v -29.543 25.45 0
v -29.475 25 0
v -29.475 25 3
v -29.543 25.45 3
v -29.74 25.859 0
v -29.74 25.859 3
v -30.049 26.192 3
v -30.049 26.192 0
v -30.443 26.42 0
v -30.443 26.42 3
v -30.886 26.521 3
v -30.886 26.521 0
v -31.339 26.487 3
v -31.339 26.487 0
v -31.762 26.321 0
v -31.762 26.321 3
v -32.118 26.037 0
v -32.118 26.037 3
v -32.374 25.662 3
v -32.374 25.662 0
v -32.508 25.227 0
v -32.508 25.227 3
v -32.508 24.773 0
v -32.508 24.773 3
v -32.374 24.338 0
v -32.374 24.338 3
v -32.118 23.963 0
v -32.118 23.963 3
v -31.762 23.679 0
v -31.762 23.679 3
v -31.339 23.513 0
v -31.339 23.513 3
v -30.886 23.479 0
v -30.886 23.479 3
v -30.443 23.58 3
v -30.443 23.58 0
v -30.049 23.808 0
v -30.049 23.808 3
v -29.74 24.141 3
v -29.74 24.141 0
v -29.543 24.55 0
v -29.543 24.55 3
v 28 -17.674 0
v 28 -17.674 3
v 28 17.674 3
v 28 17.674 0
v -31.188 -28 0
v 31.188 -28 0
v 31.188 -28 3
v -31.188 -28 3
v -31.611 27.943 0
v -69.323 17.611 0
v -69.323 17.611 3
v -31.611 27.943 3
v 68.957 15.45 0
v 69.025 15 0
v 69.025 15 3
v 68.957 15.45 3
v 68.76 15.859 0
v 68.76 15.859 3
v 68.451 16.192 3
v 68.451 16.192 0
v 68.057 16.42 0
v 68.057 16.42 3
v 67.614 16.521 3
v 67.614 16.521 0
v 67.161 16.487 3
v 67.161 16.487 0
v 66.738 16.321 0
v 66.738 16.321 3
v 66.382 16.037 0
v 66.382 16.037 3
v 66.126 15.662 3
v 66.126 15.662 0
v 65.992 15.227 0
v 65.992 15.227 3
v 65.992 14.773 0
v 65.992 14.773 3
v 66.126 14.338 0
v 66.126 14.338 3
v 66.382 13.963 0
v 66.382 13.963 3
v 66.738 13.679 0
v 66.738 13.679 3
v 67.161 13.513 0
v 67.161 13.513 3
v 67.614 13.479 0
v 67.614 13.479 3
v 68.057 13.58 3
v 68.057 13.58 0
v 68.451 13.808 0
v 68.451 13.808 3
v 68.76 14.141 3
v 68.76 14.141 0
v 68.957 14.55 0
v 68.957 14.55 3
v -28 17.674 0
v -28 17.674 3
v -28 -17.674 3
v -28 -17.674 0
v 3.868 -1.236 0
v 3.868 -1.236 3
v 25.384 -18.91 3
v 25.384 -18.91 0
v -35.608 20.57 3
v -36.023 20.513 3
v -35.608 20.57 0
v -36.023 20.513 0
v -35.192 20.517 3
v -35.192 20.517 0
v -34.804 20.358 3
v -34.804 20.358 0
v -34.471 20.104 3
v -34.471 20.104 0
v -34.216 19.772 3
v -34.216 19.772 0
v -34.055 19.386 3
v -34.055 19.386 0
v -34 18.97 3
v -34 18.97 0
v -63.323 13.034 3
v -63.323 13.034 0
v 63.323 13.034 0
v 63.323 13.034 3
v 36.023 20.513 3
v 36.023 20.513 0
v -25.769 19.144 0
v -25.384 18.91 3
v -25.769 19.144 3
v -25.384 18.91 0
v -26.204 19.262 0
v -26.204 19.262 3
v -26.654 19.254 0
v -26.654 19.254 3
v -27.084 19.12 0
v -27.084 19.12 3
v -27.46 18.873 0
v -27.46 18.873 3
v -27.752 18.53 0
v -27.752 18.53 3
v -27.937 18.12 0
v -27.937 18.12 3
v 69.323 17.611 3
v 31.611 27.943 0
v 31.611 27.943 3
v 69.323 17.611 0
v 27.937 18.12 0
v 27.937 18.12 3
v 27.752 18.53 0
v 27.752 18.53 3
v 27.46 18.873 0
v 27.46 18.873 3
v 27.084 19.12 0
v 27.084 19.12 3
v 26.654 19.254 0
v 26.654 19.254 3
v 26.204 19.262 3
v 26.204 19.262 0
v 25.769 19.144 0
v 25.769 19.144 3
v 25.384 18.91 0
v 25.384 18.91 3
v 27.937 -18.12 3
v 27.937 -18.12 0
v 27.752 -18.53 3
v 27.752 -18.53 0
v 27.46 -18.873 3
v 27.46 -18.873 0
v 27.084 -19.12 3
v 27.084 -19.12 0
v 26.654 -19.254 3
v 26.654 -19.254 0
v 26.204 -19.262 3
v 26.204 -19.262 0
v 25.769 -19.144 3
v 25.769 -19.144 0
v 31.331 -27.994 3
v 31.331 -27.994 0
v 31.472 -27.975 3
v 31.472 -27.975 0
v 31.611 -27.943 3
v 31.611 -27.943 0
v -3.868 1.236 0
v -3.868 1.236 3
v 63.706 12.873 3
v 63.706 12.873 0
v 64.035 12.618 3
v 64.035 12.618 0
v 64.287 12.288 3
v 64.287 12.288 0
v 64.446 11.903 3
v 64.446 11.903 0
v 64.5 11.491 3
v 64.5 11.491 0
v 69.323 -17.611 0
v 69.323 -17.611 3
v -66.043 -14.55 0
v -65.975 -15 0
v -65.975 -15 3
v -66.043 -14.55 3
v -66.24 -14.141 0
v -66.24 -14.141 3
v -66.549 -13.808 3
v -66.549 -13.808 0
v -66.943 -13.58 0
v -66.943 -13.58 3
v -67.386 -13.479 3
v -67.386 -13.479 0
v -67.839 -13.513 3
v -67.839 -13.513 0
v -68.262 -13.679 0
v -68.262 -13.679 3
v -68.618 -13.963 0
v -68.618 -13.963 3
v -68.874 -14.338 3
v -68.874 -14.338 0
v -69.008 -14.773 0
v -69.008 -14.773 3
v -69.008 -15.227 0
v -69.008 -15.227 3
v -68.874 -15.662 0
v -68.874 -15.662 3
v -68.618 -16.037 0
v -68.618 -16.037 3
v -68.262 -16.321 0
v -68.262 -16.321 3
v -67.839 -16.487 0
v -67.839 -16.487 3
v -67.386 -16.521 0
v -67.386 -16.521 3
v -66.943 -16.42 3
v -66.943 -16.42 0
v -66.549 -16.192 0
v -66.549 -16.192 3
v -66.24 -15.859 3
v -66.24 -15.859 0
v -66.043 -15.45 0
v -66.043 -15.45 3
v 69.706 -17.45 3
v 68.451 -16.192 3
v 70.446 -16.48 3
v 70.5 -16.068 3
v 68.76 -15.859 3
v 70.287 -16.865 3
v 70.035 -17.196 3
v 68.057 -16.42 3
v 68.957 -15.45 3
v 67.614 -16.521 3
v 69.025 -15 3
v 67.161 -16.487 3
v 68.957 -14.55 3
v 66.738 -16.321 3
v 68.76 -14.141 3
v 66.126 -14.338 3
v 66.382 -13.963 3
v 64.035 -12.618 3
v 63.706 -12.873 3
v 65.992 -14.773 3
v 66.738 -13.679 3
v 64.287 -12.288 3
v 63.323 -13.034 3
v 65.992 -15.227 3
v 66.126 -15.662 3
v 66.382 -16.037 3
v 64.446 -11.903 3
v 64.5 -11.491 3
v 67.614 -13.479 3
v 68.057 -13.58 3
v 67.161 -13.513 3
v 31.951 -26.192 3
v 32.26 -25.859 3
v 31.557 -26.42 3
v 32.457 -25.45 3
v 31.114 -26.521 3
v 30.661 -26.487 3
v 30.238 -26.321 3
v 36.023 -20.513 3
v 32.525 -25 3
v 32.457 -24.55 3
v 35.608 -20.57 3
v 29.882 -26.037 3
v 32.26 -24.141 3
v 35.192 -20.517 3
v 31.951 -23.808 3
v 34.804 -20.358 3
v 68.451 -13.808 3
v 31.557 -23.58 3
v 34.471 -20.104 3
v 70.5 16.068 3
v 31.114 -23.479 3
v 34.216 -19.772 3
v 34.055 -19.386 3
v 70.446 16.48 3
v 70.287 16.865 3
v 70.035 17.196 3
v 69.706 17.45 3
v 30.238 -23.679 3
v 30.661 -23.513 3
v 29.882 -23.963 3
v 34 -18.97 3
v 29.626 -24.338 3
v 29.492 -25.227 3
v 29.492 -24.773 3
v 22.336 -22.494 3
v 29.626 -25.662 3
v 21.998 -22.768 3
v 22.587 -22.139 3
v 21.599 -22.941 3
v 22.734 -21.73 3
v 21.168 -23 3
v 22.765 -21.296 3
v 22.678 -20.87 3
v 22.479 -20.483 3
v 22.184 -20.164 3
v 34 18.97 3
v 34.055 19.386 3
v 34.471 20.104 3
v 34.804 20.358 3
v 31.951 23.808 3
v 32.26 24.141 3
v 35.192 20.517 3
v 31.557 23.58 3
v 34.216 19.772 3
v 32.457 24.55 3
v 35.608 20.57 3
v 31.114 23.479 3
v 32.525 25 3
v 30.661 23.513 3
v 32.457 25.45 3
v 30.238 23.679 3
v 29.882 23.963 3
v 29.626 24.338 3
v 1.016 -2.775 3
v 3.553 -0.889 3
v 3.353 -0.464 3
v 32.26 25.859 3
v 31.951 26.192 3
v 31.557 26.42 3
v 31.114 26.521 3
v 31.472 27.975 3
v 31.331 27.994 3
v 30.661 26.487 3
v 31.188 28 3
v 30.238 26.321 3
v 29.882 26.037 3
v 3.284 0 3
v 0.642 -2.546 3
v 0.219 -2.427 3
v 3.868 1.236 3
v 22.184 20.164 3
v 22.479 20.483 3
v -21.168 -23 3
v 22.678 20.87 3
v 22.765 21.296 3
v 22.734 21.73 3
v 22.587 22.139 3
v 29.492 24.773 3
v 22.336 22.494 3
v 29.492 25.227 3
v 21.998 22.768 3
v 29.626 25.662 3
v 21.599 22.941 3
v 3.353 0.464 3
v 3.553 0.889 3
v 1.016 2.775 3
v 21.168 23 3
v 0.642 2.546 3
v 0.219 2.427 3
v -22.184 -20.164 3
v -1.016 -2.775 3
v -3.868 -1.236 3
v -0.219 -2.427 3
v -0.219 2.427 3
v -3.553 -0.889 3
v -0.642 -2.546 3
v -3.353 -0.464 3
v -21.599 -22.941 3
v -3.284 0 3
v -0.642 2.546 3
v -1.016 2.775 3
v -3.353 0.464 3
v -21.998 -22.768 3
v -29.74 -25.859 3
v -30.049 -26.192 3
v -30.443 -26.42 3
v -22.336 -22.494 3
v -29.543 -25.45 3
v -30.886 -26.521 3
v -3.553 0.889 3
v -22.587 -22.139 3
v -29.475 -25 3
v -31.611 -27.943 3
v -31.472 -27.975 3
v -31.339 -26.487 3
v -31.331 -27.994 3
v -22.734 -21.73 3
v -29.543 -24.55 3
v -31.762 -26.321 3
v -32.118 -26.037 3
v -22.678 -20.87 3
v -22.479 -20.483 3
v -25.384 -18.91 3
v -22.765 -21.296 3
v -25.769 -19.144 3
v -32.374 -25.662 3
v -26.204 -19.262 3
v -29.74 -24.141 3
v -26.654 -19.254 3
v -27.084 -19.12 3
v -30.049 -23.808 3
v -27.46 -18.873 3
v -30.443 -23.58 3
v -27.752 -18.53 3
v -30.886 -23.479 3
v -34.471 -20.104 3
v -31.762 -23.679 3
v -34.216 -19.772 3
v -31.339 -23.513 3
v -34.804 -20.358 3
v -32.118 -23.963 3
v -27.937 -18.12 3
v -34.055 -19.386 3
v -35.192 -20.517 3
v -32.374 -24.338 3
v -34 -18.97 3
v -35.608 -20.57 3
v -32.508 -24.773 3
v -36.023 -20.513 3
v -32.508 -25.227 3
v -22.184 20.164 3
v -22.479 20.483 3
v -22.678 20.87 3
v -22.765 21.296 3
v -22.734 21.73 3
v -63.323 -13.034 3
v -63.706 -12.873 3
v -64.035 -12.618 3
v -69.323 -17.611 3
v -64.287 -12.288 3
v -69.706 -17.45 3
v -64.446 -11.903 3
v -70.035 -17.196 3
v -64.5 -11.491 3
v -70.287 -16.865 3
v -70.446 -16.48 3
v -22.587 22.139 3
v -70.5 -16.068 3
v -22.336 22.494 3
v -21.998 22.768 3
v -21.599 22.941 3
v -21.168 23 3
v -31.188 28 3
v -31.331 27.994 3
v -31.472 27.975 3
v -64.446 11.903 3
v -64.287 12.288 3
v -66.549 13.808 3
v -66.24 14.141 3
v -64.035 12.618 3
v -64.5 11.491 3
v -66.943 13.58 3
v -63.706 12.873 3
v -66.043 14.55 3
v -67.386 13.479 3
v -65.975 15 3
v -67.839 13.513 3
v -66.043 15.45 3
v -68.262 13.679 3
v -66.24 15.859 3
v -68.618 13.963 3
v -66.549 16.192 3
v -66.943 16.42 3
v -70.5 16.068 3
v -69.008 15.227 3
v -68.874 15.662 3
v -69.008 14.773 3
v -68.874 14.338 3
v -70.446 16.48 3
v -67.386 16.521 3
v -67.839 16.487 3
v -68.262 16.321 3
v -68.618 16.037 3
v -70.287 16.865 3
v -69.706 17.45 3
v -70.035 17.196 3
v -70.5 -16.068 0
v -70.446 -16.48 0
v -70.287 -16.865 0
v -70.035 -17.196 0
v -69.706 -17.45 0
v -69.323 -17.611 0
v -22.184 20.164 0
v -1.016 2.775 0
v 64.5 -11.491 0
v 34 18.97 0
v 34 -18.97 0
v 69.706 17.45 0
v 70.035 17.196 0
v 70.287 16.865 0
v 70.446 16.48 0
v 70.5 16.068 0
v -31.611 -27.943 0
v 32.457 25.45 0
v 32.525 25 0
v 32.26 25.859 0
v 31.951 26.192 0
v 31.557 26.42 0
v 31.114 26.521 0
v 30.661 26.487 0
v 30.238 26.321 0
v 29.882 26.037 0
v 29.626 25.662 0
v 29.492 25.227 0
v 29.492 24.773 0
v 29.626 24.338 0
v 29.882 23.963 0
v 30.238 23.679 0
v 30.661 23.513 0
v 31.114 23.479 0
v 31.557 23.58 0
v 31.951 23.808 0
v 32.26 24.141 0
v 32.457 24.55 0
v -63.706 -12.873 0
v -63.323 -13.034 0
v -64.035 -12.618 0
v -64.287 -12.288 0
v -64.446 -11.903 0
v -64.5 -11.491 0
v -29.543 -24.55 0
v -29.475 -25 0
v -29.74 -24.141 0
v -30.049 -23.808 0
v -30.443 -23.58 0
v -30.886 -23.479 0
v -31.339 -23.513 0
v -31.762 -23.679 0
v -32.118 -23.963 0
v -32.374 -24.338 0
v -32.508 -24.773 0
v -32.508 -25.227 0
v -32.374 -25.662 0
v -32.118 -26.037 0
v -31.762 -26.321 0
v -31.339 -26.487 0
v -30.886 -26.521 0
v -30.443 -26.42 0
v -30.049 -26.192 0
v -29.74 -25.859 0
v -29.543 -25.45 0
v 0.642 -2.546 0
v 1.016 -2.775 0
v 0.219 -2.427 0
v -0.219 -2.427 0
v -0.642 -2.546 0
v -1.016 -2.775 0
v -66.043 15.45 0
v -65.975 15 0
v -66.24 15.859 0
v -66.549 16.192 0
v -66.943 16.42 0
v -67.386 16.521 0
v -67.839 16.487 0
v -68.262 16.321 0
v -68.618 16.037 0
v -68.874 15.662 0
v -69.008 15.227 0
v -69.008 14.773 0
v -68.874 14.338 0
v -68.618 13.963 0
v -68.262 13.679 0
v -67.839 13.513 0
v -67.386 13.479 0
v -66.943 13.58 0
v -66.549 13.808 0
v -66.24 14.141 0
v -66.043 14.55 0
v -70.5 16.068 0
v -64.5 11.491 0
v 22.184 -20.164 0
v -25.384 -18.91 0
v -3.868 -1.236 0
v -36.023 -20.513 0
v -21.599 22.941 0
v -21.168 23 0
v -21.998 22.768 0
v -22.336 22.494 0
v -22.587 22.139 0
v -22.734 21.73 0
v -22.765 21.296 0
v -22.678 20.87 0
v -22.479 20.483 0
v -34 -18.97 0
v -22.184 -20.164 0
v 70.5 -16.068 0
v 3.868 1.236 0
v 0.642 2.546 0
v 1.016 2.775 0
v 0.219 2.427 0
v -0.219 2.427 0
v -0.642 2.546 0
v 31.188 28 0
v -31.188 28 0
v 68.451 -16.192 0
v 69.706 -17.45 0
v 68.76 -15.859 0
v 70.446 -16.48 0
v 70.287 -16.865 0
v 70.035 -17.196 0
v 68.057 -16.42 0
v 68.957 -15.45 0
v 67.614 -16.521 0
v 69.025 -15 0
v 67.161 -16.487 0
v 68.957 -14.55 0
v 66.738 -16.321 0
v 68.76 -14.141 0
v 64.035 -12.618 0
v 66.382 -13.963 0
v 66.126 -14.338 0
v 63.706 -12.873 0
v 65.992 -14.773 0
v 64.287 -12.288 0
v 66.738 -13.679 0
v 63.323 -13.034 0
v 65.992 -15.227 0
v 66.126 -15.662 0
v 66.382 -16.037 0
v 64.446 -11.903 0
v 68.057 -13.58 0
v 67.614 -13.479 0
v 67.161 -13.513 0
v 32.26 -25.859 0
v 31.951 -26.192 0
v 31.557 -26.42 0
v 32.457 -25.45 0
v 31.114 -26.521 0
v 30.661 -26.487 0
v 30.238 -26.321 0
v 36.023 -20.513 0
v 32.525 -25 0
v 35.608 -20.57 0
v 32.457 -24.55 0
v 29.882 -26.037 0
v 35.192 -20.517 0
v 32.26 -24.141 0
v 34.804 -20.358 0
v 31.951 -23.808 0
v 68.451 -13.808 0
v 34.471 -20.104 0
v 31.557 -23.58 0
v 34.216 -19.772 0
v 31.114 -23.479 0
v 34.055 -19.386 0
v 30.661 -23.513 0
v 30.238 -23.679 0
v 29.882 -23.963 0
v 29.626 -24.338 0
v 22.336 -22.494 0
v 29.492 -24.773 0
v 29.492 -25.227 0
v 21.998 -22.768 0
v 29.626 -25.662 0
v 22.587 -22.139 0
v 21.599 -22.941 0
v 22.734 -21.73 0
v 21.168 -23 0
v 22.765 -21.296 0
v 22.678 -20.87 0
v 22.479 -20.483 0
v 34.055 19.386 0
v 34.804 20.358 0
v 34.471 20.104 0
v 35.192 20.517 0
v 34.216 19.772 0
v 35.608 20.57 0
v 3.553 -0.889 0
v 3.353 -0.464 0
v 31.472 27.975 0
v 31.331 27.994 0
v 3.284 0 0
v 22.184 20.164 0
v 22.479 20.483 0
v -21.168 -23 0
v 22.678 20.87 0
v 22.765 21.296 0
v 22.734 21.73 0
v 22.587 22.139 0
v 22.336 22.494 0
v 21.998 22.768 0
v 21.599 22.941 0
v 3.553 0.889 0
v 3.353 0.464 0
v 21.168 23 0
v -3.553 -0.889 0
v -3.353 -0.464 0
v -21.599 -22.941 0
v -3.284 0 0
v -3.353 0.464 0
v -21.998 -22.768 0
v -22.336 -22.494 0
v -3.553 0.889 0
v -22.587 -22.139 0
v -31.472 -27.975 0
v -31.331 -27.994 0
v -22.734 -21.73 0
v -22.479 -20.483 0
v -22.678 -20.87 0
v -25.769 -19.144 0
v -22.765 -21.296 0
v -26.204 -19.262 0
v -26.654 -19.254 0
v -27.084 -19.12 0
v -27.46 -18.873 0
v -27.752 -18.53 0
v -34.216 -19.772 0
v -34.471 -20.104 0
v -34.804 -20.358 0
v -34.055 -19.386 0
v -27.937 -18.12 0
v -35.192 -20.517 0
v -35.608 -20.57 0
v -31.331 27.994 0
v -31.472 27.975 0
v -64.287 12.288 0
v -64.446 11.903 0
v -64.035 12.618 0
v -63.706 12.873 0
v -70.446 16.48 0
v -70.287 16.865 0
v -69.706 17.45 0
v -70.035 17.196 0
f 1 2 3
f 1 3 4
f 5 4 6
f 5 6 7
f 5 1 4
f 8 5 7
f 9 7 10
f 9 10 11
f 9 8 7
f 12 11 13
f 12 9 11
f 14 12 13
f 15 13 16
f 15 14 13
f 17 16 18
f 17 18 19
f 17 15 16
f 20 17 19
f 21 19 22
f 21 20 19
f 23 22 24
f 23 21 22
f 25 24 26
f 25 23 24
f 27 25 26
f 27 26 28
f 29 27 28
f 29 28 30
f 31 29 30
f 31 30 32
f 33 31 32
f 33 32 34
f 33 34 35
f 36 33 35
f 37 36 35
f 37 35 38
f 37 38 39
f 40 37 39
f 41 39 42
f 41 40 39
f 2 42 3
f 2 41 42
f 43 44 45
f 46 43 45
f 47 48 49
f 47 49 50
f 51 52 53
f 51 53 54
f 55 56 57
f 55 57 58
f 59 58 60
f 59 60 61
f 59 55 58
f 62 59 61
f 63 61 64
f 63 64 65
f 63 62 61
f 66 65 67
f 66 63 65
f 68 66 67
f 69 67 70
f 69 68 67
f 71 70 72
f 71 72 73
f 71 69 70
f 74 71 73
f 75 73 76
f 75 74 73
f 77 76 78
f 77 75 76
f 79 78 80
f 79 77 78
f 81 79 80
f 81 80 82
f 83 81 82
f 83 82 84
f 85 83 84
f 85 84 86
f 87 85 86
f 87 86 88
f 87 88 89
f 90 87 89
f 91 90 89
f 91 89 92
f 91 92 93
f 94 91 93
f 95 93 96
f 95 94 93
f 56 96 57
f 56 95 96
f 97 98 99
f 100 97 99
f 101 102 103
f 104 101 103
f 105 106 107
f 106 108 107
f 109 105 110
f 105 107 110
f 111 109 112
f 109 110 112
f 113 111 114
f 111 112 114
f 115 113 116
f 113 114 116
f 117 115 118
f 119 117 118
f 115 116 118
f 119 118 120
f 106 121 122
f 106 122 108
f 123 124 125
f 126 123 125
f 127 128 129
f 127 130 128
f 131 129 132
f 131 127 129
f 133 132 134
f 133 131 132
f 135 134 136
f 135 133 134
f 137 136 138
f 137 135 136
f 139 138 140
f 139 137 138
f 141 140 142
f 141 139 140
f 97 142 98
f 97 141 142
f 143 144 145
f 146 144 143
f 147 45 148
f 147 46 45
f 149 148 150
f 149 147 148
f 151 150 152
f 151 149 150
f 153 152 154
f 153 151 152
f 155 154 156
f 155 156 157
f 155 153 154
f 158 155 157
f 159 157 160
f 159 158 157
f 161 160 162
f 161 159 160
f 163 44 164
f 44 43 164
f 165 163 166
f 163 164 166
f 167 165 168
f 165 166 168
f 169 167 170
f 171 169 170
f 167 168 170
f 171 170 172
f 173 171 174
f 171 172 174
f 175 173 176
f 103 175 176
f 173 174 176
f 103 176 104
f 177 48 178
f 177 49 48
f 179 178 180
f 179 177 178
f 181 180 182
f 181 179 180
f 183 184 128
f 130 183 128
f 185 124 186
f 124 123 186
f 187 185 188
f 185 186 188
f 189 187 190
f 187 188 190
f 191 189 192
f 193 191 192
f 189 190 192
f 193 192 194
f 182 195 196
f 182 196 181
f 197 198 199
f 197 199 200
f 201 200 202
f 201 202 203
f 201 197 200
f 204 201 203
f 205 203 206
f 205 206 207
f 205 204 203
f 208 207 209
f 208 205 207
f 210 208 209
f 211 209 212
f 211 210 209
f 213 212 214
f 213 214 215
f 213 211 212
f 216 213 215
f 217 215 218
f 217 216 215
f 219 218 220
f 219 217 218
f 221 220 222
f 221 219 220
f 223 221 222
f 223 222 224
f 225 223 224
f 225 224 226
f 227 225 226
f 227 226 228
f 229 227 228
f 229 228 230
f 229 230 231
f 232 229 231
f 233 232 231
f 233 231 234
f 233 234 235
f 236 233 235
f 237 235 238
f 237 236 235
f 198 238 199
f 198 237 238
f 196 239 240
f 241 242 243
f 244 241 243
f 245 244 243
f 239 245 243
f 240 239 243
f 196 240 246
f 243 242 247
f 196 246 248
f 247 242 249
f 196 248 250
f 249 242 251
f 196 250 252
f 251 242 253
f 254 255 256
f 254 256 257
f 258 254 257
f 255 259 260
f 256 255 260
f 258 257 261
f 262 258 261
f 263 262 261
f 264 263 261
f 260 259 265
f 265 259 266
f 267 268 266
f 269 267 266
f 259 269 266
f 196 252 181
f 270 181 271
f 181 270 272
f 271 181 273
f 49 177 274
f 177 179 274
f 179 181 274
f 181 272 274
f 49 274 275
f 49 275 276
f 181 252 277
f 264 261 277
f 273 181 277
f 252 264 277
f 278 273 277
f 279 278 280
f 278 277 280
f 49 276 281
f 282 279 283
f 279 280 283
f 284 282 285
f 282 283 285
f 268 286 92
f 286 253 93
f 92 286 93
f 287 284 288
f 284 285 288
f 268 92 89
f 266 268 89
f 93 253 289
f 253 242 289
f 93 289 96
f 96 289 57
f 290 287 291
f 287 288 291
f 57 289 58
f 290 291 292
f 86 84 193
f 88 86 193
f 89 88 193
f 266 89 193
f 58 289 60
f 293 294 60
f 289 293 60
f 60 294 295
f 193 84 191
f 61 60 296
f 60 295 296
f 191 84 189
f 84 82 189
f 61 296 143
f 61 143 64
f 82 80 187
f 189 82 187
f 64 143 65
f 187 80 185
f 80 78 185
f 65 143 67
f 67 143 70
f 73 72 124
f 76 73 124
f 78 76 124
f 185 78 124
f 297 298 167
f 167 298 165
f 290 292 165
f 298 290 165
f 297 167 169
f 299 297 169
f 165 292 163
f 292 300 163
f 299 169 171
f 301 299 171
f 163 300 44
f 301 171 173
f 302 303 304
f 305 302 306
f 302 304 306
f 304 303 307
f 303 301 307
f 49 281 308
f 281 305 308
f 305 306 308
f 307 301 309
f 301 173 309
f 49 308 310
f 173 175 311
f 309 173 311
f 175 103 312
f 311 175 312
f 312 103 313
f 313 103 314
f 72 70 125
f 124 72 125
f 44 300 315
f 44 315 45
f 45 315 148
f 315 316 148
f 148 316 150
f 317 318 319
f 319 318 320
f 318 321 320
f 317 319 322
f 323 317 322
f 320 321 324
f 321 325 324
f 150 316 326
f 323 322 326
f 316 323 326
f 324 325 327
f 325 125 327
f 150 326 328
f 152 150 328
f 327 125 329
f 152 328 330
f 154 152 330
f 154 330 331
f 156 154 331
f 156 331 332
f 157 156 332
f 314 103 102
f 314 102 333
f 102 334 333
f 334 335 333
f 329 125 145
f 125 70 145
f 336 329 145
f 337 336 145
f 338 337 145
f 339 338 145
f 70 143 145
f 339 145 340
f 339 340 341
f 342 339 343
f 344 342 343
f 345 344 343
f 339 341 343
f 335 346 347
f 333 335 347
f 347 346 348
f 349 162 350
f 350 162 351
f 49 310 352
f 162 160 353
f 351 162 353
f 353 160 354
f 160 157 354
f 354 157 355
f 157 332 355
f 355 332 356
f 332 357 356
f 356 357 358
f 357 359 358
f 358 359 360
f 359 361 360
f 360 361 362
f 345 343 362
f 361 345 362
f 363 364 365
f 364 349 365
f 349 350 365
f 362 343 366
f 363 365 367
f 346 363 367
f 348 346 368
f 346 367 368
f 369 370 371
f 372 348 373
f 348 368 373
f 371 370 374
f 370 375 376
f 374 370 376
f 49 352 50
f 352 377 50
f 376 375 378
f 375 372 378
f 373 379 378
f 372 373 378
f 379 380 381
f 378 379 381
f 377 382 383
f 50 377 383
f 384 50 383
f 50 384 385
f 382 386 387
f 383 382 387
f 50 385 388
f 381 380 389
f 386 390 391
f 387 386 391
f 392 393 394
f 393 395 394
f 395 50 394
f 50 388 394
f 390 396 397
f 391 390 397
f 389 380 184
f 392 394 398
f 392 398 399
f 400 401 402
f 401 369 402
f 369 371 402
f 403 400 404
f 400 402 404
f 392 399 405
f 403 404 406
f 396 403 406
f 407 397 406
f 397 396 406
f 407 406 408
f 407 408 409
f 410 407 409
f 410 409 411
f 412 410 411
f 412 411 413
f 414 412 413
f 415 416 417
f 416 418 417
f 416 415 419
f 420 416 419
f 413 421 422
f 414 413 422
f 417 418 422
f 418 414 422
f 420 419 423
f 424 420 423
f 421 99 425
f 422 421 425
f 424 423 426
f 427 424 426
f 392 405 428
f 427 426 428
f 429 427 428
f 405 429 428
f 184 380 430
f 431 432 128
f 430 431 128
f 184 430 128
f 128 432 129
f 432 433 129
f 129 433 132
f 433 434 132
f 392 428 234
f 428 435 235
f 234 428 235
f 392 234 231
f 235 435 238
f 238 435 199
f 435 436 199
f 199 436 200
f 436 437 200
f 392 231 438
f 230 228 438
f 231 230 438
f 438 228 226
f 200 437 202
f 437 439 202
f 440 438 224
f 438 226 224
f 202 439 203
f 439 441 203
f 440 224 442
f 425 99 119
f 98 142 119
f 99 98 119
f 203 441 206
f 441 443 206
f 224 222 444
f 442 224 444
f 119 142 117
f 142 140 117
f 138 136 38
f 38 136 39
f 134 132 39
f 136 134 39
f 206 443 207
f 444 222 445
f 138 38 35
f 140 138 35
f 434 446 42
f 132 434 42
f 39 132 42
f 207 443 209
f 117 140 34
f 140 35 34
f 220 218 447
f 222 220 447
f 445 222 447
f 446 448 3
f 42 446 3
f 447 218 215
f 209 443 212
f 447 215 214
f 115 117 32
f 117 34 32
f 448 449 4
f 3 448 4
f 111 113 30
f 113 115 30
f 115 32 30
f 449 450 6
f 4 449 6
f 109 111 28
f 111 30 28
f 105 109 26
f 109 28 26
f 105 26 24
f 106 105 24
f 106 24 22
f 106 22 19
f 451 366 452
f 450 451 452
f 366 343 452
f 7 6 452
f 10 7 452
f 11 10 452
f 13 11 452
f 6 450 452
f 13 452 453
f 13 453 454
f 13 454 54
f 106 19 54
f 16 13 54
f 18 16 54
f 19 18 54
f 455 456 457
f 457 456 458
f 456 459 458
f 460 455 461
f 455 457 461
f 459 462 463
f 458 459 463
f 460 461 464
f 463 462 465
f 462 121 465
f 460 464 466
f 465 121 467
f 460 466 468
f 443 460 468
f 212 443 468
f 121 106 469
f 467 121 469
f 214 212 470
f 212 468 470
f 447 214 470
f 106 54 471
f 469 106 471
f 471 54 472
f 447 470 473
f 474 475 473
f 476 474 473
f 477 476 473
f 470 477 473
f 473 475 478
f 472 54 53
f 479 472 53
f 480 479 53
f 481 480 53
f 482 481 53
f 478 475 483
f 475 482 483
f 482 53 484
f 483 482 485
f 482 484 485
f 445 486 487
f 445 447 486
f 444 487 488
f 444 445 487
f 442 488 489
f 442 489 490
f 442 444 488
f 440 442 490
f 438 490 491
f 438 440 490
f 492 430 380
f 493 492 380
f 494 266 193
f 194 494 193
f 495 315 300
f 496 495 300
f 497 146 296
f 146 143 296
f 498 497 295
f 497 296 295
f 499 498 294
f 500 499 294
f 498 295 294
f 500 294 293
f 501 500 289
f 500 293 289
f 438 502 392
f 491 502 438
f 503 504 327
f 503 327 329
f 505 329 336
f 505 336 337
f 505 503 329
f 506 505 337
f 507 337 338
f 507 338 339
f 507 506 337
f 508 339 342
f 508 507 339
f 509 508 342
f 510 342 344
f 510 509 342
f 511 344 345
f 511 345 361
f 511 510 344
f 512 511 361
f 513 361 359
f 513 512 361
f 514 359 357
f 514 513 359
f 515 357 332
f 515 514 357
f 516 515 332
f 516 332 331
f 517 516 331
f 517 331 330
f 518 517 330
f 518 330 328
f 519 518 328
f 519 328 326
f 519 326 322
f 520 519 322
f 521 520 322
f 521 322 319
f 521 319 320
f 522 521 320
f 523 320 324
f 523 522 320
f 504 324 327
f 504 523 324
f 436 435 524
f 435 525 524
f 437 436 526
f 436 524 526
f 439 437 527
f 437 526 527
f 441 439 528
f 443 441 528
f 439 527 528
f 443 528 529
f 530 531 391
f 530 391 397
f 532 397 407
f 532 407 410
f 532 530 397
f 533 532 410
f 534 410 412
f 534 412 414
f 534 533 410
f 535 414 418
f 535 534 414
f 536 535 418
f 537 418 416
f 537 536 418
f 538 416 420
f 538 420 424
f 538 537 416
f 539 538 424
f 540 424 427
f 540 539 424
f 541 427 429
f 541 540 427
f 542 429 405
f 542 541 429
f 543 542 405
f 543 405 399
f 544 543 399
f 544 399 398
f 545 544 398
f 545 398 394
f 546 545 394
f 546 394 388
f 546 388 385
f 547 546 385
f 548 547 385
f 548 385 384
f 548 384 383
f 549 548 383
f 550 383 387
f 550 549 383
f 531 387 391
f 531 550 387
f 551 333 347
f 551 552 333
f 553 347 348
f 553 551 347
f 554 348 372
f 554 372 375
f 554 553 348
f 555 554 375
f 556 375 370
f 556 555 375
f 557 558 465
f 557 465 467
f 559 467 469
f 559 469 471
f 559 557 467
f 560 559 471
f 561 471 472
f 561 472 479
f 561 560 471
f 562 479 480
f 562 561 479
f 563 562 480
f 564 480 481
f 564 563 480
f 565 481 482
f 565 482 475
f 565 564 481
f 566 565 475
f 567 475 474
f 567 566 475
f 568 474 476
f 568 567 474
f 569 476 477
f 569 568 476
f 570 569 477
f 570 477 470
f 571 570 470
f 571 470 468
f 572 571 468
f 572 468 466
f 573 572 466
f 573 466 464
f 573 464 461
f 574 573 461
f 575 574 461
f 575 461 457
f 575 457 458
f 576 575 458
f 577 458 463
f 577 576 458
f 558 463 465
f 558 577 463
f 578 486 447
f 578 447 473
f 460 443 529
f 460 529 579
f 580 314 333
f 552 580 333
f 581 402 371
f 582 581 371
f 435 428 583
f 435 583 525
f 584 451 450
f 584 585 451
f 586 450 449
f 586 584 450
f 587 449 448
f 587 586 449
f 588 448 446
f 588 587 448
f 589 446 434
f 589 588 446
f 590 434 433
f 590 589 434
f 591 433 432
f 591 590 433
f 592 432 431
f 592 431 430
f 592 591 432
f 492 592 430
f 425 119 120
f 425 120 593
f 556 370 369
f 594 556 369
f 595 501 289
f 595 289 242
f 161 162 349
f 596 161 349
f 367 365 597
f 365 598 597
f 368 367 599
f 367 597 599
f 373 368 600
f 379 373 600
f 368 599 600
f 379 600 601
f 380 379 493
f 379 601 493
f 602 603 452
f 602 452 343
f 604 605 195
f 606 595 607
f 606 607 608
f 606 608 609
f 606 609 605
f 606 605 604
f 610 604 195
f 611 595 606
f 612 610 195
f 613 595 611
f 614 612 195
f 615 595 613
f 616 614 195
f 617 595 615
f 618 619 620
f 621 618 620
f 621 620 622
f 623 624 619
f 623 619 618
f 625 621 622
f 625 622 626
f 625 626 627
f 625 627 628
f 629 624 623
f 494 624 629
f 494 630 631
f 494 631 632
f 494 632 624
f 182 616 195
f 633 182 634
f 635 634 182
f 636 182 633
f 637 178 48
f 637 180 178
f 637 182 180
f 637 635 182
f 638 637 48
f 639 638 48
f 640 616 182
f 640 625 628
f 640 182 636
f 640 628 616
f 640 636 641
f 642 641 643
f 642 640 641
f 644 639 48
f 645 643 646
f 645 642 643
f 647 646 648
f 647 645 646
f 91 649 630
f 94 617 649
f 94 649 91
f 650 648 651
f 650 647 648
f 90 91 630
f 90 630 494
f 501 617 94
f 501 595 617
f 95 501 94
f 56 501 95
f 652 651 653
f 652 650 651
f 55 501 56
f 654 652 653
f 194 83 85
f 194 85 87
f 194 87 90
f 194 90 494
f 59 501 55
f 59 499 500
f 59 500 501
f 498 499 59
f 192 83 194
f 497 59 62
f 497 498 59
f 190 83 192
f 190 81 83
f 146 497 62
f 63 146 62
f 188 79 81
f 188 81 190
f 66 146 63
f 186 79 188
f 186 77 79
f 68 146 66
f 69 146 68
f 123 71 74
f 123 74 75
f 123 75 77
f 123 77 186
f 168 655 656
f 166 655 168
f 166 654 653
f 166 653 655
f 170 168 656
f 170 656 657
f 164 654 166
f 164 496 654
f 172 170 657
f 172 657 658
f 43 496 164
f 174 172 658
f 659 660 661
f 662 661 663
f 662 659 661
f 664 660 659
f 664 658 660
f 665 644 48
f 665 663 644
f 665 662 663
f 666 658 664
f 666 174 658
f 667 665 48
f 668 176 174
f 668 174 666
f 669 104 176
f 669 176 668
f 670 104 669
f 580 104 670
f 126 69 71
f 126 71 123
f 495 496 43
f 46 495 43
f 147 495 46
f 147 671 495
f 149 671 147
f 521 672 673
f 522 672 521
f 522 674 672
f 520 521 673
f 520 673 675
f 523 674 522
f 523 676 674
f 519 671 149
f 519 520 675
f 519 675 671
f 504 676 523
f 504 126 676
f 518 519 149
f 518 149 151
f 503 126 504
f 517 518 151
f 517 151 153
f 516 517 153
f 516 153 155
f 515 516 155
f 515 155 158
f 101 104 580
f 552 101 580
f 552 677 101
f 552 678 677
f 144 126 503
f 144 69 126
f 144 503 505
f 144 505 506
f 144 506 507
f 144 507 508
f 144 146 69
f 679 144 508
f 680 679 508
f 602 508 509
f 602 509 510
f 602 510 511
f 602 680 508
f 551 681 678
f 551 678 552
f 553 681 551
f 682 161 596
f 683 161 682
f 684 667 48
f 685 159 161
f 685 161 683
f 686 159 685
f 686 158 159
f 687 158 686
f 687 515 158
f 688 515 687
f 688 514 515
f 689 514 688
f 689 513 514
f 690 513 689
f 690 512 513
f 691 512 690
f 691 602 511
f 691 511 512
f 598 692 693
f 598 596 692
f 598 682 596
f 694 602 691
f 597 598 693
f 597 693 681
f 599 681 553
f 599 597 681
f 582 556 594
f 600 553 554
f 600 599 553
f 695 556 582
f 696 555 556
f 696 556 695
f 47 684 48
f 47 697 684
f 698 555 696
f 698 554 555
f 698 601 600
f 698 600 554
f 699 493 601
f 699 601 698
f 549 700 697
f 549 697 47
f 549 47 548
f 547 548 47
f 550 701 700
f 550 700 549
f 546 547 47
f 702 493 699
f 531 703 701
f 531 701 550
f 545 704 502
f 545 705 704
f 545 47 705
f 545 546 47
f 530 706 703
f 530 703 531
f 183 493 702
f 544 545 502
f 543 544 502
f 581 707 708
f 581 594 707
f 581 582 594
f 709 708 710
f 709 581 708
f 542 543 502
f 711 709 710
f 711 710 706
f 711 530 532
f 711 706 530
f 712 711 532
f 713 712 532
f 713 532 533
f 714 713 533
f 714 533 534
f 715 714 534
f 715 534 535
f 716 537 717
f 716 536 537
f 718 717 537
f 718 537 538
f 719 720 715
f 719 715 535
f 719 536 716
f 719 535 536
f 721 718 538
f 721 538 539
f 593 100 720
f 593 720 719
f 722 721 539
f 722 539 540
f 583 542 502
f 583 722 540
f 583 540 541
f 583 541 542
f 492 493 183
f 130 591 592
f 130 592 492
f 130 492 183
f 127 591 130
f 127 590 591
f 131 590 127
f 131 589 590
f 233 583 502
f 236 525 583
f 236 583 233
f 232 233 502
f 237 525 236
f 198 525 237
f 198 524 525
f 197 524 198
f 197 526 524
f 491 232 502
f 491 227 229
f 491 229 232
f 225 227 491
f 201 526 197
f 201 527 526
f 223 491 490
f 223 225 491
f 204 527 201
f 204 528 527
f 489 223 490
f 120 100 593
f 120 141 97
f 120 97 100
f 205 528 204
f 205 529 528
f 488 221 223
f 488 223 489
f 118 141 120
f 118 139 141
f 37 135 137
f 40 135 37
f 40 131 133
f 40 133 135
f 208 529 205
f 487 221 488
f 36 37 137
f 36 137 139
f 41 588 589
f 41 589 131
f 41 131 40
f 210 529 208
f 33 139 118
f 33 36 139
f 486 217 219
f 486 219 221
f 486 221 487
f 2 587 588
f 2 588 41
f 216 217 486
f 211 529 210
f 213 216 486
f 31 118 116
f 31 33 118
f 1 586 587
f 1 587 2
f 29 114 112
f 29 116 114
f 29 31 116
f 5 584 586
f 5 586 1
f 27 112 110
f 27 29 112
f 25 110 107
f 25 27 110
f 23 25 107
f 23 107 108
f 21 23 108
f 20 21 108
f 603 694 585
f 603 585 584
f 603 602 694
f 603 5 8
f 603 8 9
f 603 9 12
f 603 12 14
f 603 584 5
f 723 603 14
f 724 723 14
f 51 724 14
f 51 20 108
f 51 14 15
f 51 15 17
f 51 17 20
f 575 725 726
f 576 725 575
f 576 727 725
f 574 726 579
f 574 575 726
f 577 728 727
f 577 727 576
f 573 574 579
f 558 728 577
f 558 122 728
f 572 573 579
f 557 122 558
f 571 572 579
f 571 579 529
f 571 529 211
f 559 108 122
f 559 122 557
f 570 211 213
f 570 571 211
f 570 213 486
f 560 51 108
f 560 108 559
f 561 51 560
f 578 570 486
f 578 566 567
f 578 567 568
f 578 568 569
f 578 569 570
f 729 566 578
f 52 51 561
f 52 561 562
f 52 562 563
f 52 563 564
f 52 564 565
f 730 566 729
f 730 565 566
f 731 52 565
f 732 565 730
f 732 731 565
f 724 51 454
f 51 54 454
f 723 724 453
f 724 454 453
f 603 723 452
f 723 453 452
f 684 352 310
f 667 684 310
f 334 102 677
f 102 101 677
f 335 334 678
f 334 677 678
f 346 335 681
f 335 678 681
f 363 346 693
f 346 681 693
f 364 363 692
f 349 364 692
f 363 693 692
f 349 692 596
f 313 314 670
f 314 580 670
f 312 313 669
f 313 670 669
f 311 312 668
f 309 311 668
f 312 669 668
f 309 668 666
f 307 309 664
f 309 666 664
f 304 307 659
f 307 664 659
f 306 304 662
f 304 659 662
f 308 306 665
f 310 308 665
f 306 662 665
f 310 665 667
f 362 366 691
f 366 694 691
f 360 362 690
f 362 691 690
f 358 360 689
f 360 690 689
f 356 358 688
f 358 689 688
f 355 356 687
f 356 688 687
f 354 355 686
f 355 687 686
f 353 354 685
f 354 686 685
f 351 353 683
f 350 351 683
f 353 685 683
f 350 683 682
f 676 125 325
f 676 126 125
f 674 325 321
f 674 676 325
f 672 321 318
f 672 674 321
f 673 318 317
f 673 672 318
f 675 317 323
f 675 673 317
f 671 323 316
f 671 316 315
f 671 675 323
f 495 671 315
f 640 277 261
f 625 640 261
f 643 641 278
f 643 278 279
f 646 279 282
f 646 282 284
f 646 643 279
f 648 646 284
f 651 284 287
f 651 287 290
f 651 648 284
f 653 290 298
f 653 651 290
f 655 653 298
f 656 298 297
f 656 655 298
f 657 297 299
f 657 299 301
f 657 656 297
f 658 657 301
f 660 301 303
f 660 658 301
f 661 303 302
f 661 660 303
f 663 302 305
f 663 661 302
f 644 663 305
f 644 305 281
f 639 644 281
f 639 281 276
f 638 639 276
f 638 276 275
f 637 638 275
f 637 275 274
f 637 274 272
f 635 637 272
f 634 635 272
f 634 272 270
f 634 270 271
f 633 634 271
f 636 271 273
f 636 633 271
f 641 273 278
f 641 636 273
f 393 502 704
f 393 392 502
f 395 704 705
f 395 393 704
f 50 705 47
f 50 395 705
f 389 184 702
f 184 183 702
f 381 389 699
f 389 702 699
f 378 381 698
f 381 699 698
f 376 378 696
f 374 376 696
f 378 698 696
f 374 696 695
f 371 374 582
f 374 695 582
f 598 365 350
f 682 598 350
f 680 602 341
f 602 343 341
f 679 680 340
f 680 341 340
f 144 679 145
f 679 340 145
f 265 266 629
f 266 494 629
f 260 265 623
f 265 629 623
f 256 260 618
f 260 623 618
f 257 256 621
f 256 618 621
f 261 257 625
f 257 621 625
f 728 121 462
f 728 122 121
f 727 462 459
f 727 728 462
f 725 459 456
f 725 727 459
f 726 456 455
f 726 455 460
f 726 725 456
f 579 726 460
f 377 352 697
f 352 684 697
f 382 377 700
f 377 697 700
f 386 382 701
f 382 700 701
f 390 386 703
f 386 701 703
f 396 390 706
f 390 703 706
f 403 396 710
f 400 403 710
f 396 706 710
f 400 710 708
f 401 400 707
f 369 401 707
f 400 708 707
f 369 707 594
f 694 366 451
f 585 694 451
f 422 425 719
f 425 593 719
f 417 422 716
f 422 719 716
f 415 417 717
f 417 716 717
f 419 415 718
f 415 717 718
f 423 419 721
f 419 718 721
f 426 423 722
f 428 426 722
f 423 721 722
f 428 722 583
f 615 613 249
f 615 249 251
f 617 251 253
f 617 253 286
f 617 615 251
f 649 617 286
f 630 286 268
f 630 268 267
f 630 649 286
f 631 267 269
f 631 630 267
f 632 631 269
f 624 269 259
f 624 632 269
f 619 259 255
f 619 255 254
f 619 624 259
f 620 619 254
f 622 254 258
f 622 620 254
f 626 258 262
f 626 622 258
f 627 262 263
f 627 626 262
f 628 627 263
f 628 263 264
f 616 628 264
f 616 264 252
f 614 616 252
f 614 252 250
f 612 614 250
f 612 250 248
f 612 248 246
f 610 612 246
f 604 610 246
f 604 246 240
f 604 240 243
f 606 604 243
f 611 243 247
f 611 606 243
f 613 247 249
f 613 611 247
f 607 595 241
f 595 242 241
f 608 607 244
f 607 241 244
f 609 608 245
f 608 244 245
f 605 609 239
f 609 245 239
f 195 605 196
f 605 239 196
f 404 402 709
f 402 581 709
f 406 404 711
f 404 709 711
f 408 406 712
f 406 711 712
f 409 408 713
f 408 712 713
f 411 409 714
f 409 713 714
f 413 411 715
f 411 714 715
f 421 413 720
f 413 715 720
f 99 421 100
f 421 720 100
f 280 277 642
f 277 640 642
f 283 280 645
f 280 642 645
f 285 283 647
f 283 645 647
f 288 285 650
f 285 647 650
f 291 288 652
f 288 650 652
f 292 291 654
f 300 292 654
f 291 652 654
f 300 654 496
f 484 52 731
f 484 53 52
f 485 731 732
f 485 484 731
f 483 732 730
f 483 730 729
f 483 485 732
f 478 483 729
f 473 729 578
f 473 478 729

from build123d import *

# Parameters (mm, degrees)
SKETCH_1_R          = 1.525
EXTRUDE_1_DEPTH     = 3
CUT_EXTRUDE_1_DEPTH = 3
CUT_EXTRUDE_2_DEPTH = 3
FILLET_1_R          = 1.6


with BuildPart() as part:
    # 草图1 → 凸台-拉伸1 (new body)
    with BuildSketch(Plane.XY):
        Polygon((-70.5, 17.288636625), (-31.403523682, 28), (31.403523682, 28), (70.5, 17.288636625), (70.5, -17.288636625), (31.403523682, -28), (-31.403523682, -28), (-70.5, -17.288636625), align=None)
        with Locations((31, 25)):
            Circle(SKETCH_1_R, mode=Mode.SUBTRACT)
        with Locations((-31, 25)):
            Circle(SKETCH_1_R, mode=Mode.SUBTRACT)
        with Locations((-31, -25)):
            Circle(SKETCH_1_R, mode=Mode.SUBTRACT)
        with Locations((31, -25)):
            Circle(SKETCH_1_R, mode=Mode.SUBTRACT)
        with Locations((-67.5, -15)):
            Circle(SKETCH_1_R, mode=Mode.SUBTRACT)
        with Locations((-67.5, 15)):
            Circle(SKETCH_1_R, mode=Mode.SUBTRACT)
        with Locations((67.5, 15)):
            Circle(SKETCH_1_R, mode=Mode.SUBTRACT)
        with Locations((67.5, -15)):
            Circle(SKETCH_1_R, mode=Mode.SUBTRACT)
    extrude(amount=EXTRUDE_1_DEPTH)

    # 草图2 → 切除-拉伸1 (cut)
    with BuildSketch(Plane.XY.offset(3)):
        Polygon((-28, 21.058820972), (-28, -21.058820972), (-2.363174469, 0), align=None)
        Polygon((0, -1.941179028), (-25.636825531, -23), (25.636825531, -23), align=None)
        Polygon((28, 21.058820972), (2.363174469, 0), (28, -21.058820972), align=None)
        Polygon((-25.636825531, 23), (0, 1.941179028), (25.636825531, 23), align=None)
    extrude(amount=-CUT_EXTRUDE_1_DEPTH, mode=Mode.SUBTRACT)

    # 草图3 → 切除-拉伸2 (cut)
    with BuildSketch(Plane.XY.offset(3)):
        Polygon((34, 21.067527758), (34, -21.067527758), (64.5, -12.711363375), (64.5, 12.711363375), align=None)
        Polygon((-64.5, 12.711363375), (-34, 21.067527758), (-34, -21.067527758), (-64.5, -12.711363375), align=None)
    extrude(amount=-CUT_EXTRUDE_2_DEPTH, mode=Mode.SUBTRACT)

    # 圆角1
    fillet_1_edges = [part.edges().sort_by_distance(p)[0] for p in [
        (34, 21.067527758, 1.5),
        (64.5, 12.711363375, 1.5),
        (64.5, -12.711363375, 1.5),
        (34, -21.067527758, 1.5),
        (-34, 21.067527758, 1.5),
        (-34, -21.067527758, 1.5),
        (-64.5, -12.711363375, 1.5),
        (-64.5, 12.711363375, 1.5),
        (-70.5, 17.288636625, 1.5),
        (-31.403523682, 28, 1.5),
        (31.403523682, 28, 1.5),
        (70.5, 17.288636625, 1.5),
        (70.5, -17.288636625, 1.5),
        (31.403523682, -28, 1.5),
        (-31.403523682, -28, 1.5),
        (-70.5, -17.288636625, 1.5),
        (2.363174469, 0, 1.5),
        (28, 21.058820972, 1.5),
        (28, -21.058820972, 1.5),
        (-25.636825531, -23, 1.5),
        (0, -1.941179028, 1.5),
        (25.636825531, -23, 1.5),
        (0, 1.941179028, 1.5),
        (-25.636825531, 23, 1.5),
        (25.636825531, 23, 1.5),
        (-28, -21.058820972, 1.5),
        (-28, 21.058820972, 1.5),
        (-2.363174469, 0, 1.5),
    ]]
    fillet(fillet_1_edges, radius=FILLET_1_R)


solid = part.part
